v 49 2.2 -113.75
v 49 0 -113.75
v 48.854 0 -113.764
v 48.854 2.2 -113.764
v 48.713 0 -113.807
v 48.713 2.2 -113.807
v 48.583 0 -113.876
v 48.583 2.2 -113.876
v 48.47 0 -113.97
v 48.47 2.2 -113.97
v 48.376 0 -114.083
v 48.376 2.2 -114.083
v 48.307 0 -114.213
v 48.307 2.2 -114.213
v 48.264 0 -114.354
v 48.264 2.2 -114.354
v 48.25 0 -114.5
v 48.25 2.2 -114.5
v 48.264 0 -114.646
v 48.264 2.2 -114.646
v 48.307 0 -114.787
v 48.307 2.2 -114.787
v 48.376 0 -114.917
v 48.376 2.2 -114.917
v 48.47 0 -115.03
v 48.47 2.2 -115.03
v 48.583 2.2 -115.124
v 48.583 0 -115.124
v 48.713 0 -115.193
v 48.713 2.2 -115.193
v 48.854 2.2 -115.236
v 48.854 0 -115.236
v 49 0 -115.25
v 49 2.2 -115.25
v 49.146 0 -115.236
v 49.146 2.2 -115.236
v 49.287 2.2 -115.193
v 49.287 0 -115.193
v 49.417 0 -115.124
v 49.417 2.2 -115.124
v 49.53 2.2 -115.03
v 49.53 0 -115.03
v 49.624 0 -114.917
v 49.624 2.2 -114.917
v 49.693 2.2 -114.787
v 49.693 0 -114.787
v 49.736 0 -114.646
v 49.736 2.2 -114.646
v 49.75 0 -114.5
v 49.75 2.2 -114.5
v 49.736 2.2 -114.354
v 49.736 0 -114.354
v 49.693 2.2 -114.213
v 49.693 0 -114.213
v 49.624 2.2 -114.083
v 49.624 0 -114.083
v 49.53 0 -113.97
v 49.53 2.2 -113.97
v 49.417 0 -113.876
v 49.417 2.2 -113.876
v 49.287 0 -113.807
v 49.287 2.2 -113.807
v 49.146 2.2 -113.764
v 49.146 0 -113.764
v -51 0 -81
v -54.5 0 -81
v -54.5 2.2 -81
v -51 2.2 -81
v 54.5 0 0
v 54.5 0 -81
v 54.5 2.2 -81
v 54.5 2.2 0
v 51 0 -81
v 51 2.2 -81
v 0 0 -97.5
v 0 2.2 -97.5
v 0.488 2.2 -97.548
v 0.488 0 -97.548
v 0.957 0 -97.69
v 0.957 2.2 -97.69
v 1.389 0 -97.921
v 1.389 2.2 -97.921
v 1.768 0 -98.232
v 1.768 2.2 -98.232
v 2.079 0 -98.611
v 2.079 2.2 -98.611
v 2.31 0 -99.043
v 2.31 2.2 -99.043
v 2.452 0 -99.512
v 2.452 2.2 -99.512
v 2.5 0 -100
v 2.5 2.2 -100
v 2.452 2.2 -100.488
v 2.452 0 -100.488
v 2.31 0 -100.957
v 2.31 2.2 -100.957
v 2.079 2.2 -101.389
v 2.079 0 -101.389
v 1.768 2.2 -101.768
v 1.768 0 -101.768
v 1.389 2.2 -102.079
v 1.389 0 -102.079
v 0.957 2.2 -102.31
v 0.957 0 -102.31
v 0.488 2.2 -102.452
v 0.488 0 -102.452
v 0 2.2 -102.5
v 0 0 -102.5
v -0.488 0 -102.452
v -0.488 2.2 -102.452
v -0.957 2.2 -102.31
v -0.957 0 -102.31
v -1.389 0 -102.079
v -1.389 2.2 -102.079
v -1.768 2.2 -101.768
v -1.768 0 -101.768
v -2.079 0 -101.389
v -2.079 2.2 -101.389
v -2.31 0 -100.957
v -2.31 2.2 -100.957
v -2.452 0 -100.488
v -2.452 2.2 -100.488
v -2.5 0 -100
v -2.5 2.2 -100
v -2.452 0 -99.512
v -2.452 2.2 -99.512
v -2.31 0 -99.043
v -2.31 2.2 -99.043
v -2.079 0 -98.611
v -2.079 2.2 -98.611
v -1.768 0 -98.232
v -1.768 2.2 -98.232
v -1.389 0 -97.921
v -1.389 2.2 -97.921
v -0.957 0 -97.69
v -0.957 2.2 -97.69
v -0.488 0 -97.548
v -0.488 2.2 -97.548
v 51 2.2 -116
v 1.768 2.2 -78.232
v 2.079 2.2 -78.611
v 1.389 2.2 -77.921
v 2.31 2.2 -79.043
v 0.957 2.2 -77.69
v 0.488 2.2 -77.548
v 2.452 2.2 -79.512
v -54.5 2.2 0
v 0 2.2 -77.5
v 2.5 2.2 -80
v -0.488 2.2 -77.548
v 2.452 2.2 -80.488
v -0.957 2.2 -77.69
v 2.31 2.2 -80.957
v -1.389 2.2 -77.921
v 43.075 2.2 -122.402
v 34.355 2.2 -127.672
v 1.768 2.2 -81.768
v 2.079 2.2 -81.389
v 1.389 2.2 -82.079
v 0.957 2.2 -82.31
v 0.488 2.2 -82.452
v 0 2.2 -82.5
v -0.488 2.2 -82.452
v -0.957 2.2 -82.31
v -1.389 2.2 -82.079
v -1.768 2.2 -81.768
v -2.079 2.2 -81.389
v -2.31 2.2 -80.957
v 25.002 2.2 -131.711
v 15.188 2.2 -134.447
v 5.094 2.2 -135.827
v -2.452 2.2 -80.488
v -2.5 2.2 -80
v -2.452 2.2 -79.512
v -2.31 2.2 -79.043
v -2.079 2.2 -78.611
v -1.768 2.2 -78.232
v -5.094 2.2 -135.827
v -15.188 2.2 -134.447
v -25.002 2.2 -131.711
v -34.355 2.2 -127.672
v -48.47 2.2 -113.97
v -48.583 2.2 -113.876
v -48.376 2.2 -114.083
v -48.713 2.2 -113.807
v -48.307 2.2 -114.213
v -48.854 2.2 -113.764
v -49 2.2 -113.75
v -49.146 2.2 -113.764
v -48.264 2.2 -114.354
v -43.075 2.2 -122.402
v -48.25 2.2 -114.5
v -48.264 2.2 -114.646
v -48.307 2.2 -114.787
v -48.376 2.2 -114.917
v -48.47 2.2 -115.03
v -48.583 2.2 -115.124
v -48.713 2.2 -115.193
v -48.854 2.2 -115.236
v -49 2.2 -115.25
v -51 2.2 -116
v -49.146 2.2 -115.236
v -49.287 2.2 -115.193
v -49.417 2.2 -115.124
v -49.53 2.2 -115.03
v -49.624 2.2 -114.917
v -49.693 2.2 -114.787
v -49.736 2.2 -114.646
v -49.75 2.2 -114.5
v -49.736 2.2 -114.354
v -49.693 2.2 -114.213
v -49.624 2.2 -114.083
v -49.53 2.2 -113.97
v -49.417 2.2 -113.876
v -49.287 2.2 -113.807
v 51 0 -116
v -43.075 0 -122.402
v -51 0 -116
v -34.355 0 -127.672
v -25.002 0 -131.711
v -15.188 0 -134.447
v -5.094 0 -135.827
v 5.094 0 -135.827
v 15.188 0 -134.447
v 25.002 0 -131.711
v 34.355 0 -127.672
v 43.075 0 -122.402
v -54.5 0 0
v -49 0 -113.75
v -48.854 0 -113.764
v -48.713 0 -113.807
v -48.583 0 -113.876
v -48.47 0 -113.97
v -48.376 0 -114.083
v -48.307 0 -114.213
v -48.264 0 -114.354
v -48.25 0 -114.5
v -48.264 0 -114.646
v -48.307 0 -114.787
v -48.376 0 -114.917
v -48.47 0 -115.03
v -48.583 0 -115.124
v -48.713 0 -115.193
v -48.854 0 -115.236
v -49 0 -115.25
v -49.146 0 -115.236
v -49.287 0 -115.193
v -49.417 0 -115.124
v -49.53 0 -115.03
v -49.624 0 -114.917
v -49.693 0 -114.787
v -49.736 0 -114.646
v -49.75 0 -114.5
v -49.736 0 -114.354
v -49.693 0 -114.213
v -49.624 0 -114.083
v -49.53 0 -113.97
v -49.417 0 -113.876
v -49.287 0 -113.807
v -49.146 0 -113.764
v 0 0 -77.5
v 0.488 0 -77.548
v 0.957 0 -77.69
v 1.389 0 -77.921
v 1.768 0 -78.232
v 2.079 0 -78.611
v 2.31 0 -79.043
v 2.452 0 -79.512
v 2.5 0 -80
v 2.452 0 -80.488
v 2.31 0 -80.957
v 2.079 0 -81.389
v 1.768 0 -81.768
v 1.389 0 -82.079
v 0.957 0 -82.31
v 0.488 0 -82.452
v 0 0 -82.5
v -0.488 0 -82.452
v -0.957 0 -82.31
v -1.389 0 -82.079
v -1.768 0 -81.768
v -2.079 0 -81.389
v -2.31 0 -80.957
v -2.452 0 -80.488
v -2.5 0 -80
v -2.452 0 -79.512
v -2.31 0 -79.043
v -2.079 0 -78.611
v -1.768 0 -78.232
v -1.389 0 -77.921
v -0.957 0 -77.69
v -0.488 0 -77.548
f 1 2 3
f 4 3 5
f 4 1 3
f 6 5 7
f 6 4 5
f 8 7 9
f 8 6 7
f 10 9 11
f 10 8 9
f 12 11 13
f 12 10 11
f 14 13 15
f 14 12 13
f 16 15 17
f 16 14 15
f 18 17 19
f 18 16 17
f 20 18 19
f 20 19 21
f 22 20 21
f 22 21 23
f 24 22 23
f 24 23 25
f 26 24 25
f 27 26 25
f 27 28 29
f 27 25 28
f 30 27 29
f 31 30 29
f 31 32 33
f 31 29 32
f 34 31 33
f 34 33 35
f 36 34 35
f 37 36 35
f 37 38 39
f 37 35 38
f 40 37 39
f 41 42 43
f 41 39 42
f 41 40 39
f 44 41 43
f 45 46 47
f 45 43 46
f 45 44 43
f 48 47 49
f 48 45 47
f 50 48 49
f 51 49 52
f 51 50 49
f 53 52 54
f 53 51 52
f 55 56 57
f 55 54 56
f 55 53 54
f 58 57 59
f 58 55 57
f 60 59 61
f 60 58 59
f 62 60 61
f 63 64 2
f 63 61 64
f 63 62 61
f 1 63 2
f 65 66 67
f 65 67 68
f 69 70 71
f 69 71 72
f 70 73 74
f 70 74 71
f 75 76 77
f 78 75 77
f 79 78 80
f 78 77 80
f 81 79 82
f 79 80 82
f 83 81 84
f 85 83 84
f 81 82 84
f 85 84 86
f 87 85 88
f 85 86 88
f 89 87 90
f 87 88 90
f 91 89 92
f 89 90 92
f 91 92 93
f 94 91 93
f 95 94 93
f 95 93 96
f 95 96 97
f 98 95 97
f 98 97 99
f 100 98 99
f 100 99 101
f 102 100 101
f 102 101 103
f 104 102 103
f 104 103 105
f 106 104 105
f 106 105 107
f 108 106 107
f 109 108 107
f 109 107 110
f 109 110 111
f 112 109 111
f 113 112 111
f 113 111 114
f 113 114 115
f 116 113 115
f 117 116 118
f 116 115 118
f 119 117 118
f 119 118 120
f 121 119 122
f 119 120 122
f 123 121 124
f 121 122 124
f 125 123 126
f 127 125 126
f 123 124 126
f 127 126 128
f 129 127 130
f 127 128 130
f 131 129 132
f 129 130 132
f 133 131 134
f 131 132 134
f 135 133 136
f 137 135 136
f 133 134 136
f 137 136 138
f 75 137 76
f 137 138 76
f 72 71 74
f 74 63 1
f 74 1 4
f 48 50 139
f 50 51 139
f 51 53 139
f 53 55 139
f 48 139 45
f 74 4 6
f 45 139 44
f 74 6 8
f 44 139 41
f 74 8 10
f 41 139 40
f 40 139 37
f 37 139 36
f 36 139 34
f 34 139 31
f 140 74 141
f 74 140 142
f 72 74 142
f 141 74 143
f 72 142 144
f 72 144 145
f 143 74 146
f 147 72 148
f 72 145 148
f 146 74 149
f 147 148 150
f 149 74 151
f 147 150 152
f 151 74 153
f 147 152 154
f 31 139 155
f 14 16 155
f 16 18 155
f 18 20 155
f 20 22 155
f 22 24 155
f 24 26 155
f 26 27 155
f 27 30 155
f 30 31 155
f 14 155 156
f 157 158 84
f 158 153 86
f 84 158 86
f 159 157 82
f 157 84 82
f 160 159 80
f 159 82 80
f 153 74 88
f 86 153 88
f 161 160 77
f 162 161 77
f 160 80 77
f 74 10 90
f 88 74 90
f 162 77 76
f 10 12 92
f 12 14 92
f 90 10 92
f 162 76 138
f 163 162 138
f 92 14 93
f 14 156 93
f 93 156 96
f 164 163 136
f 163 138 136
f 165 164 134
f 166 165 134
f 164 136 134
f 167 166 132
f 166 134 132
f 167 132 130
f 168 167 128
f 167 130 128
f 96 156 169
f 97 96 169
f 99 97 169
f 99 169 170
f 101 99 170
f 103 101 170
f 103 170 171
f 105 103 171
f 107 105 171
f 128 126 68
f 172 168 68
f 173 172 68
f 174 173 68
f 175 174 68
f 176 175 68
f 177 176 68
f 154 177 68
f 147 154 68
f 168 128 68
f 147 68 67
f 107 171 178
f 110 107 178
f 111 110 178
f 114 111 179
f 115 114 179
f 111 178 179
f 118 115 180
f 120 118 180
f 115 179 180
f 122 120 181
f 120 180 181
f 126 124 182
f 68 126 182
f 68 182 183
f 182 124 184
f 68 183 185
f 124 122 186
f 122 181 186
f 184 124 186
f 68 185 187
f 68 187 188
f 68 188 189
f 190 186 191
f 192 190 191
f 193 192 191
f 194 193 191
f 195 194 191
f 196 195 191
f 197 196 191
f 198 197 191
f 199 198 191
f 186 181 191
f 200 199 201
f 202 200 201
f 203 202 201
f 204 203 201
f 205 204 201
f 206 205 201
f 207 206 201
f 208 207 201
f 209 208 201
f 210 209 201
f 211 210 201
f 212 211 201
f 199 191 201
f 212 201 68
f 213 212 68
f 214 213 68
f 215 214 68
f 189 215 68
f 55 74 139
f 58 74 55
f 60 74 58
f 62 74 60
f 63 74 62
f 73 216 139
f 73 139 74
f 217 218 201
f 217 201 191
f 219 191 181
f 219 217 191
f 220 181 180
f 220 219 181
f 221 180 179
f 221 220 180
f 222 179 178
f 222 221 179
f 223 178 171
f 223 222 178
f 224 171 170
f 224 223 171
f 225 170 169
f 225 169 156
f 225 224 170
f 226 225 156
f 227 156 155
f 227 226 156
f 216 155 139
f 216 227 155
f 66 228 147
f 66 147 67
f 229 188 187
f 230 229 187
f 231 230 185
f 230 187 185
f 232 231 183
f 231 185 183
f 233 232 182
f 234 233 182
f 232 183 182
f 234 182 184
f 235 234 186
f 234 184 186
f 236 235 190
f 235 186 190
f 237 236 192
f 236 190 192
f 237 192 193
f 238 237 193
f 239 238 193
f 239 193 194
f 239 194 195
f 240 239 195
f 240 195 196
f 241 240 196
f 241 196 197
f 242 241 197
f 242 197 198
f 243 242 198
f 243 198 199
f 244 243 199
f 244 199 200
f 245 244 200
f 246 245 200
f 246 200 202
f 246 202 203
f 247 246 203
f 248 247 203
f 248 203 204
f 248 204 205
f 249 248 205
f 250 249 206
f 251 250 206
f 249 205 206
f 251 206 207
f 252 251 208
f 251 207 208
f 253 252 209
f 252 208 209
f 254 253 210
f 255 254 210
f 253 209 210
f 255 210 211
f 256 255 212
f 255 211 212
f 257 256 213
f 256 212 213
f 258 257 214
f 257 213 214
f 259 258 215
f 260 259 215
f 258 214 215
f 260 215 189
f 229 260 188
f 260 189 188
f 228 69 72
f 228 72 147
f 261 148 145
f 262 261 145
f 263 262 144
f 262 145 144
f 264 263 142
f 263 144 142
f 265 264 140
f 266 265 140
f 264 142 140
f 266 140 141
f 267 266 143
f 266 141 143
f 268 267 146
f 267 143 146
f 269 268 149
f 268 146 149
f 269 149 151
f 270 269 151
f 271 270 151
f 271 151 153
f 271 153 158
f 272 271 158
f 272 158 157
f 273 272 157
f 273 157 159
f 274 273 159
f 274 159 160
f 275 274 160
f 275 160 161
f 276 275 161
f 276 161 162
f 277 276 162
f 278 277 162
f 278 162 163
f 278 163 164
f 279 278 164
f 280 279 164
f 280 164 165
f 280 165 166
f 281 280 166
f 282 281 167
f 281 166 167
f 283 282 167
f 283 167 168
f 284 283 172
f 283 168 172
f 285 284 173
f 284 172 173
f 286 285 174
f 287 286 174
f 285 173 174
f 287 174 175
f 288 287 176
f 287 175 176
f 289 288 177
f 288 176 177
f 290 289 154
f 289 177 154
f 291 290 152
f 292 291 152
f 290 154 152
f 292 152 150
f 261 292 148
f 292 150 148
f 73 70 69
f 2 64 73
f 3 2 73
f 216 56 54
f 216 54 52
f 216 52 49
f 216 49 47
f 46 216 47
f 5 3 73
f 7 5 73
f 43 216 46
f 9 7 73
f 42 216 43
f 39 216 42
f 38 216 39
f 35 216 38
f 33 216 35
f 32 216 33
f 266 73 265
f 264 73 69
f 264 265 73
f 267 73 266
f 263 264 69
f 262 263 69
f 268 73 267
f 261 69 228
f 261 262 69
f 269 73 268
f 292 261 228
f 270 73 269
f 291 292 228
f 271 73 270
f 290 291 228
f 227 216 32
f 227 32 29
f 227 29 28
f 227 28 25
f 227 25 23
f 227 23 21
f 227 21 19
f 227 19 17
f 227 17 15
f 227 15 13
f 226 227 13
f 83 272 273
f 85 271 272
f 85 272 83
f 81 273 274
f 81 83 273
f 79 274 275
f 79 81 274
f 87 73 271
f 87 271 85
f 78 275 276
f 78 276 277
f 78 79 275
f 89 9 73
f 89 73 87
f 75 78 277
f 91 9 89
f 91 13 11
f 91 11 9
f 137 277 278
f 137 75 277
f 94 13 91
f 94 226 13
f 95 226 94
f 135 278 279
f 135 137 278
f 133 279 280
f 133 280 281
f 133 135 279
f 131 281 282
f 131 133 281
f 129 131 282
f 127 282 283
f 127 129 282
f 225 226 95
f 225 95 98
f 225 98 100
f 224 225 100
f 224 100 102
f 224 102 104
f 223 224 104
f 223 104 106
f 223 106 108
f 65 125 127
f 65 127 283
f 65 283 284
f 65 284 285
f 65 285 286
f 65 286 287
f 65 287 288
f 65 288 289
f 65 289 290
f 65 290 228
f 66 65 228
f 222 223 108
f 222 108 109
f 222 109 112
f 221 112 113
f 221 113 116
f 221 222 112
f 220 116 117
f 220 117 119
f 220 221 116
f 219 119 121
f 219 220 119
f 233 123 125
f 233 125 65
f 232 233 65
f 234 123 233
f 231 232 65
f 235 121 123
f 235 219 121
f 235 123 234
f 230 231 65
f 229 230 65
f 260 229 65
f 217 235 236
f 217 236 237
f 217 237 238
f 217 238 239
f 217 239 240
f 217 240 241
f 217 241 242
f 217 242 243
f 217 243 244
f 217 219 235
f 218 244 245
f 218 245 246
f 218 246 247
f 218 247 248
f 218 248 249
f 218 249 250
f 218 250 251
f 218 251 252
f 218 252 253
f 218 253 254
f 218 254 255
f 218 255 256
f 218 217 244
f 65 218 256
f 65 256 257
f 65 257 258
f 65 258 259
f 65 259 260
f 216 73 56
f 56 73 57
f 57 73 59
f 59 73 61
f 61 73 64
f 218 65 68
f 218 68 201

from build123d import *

# Parameters (mm, degrees)
BOSS_EXTRUDE1_DEPTH = 2.2
SKETCH2_R           = 0.75
SKETCH2_R_2         = 2.5
CUT_EXTRUDE1_DEPTH  = 10


with BuildPart() as part:
    # Sketch1 → Boss-Extrude1 (new body)
    with BuildSketch(Plane(origin=(0, 0, 0), x_dir=(1, 0, 0), z_dir=(0, 1, 0))):
        with BuildLine():
            Line((-54.5, 0), (-54.5, 81))
            Line((-54.5, 81), (-51, 81))
            Line((-51, 81), (-51, 116))
            ThreePointArc((-51, 116), (0, 136), (51, 116))
            Line((51, 116), (51, 81))
            Line((51, 81), (54.5, 81))
            Line((54.5, 81), (54.5, 0))
            Line((54.5, 0), (-54.5, 0))
        make_face()
    extrude(amount=BOSS_EXTRUDE1_DEPTH)

    # Sketch2 → Cut-Extrude1 (cut)
    with BuildSketch(Plane(origin=(0, 2.2, 0), x_dir=(1, 0, 0), z_dir=(0, 1, 0))):
        with Locations(Location((-49, 114.5, 0), (0, 0, 270))):
            Circle(SKETCH2_R)
        with Locations(Location((0, 100, 0), (0, 0, 270))):
            Circle(SKETCH2_R_2)
        with Locations(Location((0, 80, 0), (0, 0, 270))):
            Circle(SKETCH2_R_2)
    cut_extrude1 = extrude(amount=-CUT_EXTRUDE1_DEPTH, mode=Mode.SUBTRACT)

    # Mirror1: Cut-Extrude1 across plane
    add(cut_extrude1.mirror(Plane(origin=(0, 0, 0), x_dir=(0, 0, 1), z_dir=(1, 0, 0))), mode=Mode.SUBTRACT)


solid = part.part
